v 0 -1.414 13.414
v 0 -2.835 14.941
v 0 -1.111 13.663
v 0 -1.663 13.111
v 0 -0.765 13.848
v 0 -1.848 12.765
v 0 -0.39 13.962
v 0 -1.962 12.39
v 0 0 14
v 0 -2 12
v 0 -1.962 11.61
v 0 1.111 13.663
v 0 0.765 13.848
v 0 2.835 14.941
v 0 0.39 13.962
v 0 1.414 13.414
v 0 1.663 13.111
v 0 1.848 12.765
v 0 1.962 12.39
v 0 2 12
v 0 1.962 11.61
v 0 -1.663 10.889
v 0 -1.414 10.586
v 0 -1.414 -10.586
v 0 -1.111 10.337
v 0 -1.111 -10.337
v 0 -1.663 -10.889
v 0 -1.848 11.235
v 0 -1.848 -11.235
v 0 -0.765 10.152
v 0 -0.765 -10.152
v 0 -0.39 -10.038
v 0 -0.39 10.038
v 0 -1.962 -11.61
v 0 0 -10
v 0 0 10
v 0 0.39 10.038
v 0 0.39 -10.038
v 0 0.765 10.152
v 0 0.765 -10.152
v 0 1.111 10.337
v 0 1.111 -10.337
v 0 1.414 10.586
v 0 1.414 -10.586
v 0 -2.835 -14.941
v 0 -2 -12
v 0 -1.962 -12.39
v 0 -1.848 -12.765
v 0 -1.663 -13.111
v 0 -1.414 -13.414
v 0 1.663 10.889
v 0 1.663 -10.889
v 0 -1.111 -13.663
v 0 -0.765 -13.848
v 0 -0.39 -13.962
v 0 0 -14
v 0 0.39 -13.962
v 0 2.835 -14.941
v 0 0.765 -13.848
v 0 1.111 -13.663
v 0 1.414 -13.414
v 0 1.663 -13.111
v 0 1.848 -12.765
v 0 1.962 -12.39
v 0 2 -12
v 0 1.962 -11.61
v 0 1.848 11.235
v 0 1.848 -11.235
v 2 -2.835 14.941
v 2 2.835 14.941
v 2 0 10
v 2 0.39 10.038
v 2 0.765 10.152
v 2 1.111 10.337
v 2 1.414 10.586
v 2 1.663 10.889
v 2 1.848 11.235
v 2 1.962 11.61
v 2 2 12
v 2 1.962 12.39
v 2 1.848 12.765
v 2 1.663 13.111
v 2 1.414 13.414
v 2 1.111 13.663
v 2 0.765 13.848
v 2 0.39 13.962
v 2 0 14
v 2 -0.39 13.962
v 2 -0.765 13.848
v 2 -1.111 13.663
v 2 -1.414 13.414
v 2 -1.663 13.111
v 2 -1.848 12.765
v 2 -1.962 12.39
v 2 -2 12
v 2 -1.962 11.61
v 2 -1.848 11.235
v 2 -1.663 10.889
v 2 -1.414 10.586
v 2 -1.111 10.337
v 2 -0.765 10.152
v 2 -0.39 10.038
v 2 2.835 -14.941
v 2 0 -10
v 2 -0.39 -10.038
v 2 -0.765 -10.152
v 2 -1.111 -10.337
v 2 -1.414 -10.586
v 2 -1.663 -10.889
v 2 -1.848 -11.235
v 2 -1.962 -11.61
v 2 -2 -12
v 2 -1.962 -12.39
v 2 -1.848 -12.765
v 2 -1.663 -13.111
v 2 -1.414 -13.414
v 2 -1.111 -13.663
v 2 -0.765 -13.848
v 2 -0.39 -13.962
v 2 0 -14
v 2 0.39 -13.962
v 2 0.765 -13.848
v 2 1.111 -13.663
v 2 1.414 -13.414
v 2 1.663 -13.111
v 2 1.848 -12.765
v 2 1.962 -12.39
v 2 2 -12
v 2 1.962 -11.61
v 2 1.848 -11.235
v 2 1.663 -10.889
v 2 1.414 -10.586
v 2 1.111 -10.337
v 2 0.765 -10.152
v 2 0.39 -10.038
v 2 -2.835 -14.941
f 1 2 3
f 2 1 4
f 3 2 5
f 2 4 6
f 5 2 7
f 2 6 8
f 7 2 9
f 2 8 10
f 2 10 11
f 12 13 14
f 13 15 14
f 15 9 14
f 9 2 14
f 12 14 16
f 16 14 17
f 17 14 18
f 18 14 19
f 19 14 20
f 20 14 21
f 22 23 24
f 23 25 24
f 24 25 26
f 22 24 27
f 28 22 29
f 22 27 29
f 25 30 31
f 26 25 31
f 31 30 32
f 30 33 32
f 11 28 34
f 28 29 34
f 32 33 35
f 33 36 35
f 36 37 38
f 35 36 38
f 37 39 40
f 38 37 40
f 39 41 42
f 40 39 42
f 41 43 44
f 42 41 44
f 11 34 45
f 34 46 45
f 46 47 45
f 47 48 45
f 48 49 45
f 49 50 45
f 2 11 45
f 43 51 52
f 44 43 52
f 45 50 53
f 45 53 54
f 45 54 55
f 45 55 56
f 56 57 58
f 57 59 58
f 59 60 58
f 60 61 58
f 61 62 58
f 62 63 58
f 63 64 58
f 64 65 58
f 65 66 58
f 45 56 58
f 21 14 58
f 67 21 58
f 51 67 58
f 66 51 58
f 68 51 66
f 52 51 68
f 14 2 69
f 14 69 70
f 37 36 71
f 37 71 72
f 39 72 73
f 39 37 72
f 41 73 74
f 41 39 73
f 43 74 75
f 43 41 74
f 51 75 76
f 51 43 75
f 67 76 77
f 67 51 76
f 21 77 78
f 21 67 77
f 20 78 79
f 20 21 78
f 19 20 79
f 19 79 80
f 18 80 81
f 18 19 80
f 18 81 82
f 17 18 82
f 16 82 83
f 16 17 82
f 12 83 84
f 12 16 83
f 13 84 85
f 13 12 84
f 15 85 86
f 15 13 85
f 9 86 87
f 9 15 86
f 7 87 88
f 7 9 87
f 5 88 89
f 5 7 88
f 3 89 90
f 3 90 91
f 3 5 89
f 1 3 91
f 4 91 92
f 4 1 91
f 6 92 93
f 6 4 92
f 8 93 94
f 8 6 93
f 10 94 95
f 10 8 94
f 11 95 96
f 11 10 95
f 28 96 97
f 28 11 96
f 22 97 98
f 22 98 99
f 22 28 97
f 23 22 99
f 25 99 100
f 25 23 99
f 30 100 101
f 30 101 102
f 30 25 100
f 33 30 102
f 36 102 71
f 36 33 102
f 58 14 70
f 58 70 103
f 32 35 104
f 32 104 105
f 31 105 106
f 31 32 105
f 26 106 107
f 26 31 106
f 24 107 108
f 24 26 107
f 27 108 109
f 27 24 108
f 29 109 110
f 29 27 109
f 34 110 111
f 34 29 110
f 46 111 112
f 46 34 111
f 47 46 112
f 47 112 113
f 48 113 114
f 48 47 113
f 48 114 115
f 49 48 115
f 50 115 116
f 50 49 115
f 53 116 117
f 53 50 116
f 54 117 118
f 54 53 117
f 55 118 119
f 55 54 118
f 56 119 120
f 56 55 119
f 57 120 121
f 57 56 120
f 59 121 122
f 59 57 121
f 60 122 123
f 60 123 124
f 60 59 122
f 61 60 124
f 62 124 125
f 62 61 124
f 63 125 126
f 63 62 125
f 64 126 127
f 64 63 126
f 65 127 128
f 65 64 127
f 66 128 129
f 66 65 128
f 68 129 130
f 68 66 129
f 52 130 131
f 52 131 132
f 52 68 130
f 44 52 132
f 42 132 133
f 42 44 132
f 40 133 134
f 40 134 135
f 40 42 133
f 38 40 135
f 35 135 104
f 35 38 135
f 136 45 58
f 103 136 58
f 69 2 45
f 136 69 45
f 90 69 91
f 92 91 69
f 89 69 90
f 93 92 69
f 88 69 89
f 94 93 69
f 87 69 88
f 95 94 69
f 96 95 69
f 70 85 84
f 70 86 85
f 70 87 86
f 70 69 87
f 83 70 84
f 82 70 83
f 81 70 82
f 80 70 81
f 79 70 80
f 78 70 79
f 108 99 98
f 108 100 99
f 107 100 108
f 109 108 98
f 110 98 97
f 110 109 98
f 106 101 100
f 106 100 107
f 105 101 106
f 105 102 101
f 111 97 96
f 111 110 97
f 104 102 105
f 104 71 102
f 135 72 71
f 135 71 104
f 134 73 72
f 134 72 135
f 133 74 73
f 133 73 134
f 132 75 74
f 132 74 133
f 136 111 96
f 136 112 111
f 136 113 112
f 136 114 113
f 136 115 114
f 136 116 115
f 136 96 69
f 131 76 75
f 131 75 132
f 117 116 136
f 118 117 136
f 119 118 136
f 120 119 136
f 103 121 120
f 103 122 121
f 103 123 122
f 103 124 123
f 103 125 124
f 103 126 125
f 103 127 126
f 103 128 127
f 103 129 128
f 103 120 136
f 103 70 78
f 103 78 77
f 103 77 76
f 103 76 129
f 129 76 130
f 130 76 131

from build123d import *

# Parameters (mm, degrees)
SKETCH1_W           = 29.88277087
SKETCH1_H           = 5.669626998
SKETCH1_R           = 2
BOSS_EXTRUDE1_DEPTH = 2


with BuildPart() as part:
    # Sketch1 → Boss-Extrude1 (new body)
    with BuildSketch(Plane(origin=(0, 0, 0), x_dir=(0, 0, -1), z_dir=(1, 0, 0))):
        Rectangle(SKETCH1_W, SKETCH1_H)
        with Locations((-12, 0)):
            Circle(SKETCH1_R, mode=Mode.SUBTRACT)
        with Locations(Location((12, 0, 0), (0, 0, 180))):
            Circle(SKETCH1_R, mode=Mode.SUBTRACT)
    extrude(amount=BOSS_EXTRUDE1_DEPTH)


solid = part.part
